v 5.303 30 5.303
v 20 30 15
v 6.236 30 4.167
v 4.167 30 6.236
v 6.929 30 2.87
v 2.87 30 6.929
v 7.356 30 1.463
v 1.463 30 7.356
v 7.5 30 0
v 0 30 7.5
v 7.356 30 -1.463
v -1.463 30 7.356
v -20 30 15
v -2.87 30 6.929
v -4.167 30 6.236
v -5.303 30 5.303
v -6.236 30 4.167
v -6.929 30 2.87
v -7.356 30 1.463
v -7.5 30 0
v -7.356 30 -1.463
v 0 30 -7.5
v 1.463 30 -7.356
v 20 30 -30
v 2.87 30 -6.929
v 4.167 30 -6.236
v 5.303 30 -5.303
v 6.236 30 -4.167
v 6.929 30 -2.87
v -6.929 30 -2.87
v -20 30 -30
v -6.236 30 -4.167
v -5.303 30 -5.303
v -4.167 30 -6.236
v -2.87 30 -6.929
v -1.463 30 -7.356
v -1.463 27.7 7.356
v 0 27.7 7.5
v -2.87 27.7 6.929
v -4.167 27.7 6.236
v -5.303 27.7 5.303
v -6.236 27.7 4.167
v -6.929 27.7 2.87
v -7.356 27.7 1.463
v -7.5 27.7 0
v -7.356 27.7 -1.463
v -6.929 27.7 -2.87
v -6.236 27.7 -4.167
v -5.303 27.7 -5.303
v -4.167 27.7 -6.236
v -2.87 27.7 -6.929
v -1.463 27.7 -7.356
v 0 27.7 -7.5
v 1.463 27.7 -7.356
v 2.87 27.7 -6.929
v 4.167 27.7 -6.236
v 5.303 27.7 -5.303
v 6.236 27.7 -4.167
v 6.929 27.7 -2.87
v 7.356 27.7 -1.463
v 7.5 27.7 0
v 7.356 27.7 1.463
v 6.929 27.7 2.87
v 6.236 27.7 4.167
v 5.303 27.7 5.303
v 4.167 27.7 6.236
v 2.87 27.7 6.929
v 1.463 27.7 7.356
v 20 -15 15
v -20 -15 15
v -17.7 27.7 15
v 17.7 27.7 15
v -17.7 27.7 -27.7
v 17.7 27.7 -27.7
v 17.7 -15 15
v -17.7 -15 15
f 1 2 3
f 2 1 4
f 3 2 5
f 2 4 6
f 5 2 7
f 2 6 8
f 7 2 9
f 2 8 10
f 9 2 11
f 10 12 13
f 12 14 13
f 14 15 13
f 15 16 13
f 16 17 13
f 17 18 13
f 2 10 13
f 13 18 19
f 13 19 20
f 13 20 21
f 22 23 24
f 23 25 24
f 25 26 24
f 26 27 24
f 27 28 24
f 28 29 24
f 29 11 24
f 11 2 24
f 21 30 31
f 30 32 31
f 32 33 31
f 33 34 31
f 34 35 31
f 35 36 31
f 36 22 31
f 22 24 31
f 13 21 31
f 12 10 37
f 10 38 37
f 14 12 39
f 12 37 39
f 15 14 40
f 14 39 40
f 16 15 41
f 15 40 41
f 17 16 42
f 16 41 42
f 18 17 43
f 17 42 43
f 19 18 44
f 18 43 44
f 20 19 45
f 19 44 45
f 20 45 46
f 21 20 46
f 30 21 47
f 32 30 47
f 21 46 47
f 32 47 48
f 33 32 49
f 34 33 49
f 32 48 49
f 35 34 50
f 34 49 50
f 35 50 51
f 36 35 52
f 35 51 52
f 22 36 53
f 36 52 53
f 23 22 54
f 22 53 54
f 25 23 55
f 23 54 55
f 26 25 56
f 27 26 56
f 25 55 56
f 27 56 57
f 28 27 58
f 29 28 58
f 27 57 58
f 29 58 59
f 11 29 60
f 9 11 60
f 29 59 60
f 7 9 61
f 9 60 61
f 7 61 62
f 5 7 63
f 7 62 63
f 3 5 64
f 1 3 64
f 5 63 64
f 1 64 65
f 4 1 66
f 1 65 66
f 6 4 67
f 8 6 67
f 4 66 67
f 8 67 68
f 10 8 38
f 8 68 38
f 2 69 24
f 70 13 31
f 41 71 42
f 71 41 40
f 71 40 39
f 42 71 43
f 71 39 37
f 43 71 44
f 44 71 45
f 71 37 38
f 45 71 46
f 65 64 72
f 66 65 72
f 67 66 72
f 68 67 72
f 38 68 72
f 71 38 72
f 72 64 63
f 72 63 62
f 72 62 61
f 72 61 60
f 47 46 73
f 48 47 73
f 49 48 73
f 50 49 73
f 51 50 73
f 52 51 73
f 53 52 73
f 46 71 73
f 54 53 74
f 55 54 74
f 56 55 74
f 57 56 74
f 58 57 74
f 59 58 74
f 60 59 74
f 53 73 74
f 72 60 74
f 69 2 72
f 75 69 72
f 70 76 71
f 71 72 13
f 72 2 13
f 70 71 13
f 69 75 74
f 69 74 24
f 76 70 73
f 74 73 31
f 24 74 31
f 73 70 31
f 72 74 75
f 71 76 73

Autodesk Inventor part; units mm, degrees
ref_plane "YZ Plane" through (0, 0, 0) normal (1, 0, 0) x (0, 1, 0)
ref_plane "XZ Plane" through (0, 0, 0) normal (0, 1, 0) x (-1, 0, 0)
ref_plane "XY Plane" through (0, 0, 0) normal (0, 0, 1) x (1, 0, 0)
sketch "スケッチ1" plane through (0, 0, 0) normal (0, 0, 1) x (1, 0, 0)
  line L0 (-20, -30) -> (20, -30)
  line L1 (20, -30) -> (20, 30)
  line L2 (20, 30) -> (-20, 30)
  line L3 (-20, 30) -> (-20, -30)
  line L4 (-20, -30) -> (20, 30) construction
  line L5 (20, -30) -> (-20, 30) construction
  line L6 (-17.7, 27.7) -> (17.7, 27.7)
  line L7 (17.7, 27.7) -> (17.7, -27.7)
  line L8 (17.7, -27.7) -> (-17.7, -27.7)
  line L9 (-17.7, -27.7) -> (-17.7, 27.7)
  point P0 (0, 0)
  dimension "d0" = 40
  dimension "d1" = 60
  dimension "d2" = 2.3
extrude "押し出し1" add sketch "スケッチ1" along normal mid plane 60
chamfer "面取り1" distance 60 angle 45 1 edges at (0, -30, -30)
sketch "スケッチ2" plane through (-20, 30, 30) normal (0, 1, 0) x (1, 0, 0)
  point P0 (20, 30)
  point P1 (20, 30)
hole "穴1" at (0, 30, 0) direction (0, -1, 0) diameter 15 depth 8 tip angle 118
sketch "スケッチ4" plane through (-20, 30, 30) normal (0, 1, 0) x (1, 0, 0)
  line L0 (0, 0) -> (40, 0)
  line L1 (40, 0) -> (40, 15)
  line L2 (40, 15) -> (0, 15)
  line L3 (0, 15) -> (0, 0)
  point P0 (20, 30)
  dimension "d15" = 40
  dimension "d16" = 15
extrude "押し出し2" cut sketch "スケッチ4" against normal blind 80
properties part number "車軸受け2"
